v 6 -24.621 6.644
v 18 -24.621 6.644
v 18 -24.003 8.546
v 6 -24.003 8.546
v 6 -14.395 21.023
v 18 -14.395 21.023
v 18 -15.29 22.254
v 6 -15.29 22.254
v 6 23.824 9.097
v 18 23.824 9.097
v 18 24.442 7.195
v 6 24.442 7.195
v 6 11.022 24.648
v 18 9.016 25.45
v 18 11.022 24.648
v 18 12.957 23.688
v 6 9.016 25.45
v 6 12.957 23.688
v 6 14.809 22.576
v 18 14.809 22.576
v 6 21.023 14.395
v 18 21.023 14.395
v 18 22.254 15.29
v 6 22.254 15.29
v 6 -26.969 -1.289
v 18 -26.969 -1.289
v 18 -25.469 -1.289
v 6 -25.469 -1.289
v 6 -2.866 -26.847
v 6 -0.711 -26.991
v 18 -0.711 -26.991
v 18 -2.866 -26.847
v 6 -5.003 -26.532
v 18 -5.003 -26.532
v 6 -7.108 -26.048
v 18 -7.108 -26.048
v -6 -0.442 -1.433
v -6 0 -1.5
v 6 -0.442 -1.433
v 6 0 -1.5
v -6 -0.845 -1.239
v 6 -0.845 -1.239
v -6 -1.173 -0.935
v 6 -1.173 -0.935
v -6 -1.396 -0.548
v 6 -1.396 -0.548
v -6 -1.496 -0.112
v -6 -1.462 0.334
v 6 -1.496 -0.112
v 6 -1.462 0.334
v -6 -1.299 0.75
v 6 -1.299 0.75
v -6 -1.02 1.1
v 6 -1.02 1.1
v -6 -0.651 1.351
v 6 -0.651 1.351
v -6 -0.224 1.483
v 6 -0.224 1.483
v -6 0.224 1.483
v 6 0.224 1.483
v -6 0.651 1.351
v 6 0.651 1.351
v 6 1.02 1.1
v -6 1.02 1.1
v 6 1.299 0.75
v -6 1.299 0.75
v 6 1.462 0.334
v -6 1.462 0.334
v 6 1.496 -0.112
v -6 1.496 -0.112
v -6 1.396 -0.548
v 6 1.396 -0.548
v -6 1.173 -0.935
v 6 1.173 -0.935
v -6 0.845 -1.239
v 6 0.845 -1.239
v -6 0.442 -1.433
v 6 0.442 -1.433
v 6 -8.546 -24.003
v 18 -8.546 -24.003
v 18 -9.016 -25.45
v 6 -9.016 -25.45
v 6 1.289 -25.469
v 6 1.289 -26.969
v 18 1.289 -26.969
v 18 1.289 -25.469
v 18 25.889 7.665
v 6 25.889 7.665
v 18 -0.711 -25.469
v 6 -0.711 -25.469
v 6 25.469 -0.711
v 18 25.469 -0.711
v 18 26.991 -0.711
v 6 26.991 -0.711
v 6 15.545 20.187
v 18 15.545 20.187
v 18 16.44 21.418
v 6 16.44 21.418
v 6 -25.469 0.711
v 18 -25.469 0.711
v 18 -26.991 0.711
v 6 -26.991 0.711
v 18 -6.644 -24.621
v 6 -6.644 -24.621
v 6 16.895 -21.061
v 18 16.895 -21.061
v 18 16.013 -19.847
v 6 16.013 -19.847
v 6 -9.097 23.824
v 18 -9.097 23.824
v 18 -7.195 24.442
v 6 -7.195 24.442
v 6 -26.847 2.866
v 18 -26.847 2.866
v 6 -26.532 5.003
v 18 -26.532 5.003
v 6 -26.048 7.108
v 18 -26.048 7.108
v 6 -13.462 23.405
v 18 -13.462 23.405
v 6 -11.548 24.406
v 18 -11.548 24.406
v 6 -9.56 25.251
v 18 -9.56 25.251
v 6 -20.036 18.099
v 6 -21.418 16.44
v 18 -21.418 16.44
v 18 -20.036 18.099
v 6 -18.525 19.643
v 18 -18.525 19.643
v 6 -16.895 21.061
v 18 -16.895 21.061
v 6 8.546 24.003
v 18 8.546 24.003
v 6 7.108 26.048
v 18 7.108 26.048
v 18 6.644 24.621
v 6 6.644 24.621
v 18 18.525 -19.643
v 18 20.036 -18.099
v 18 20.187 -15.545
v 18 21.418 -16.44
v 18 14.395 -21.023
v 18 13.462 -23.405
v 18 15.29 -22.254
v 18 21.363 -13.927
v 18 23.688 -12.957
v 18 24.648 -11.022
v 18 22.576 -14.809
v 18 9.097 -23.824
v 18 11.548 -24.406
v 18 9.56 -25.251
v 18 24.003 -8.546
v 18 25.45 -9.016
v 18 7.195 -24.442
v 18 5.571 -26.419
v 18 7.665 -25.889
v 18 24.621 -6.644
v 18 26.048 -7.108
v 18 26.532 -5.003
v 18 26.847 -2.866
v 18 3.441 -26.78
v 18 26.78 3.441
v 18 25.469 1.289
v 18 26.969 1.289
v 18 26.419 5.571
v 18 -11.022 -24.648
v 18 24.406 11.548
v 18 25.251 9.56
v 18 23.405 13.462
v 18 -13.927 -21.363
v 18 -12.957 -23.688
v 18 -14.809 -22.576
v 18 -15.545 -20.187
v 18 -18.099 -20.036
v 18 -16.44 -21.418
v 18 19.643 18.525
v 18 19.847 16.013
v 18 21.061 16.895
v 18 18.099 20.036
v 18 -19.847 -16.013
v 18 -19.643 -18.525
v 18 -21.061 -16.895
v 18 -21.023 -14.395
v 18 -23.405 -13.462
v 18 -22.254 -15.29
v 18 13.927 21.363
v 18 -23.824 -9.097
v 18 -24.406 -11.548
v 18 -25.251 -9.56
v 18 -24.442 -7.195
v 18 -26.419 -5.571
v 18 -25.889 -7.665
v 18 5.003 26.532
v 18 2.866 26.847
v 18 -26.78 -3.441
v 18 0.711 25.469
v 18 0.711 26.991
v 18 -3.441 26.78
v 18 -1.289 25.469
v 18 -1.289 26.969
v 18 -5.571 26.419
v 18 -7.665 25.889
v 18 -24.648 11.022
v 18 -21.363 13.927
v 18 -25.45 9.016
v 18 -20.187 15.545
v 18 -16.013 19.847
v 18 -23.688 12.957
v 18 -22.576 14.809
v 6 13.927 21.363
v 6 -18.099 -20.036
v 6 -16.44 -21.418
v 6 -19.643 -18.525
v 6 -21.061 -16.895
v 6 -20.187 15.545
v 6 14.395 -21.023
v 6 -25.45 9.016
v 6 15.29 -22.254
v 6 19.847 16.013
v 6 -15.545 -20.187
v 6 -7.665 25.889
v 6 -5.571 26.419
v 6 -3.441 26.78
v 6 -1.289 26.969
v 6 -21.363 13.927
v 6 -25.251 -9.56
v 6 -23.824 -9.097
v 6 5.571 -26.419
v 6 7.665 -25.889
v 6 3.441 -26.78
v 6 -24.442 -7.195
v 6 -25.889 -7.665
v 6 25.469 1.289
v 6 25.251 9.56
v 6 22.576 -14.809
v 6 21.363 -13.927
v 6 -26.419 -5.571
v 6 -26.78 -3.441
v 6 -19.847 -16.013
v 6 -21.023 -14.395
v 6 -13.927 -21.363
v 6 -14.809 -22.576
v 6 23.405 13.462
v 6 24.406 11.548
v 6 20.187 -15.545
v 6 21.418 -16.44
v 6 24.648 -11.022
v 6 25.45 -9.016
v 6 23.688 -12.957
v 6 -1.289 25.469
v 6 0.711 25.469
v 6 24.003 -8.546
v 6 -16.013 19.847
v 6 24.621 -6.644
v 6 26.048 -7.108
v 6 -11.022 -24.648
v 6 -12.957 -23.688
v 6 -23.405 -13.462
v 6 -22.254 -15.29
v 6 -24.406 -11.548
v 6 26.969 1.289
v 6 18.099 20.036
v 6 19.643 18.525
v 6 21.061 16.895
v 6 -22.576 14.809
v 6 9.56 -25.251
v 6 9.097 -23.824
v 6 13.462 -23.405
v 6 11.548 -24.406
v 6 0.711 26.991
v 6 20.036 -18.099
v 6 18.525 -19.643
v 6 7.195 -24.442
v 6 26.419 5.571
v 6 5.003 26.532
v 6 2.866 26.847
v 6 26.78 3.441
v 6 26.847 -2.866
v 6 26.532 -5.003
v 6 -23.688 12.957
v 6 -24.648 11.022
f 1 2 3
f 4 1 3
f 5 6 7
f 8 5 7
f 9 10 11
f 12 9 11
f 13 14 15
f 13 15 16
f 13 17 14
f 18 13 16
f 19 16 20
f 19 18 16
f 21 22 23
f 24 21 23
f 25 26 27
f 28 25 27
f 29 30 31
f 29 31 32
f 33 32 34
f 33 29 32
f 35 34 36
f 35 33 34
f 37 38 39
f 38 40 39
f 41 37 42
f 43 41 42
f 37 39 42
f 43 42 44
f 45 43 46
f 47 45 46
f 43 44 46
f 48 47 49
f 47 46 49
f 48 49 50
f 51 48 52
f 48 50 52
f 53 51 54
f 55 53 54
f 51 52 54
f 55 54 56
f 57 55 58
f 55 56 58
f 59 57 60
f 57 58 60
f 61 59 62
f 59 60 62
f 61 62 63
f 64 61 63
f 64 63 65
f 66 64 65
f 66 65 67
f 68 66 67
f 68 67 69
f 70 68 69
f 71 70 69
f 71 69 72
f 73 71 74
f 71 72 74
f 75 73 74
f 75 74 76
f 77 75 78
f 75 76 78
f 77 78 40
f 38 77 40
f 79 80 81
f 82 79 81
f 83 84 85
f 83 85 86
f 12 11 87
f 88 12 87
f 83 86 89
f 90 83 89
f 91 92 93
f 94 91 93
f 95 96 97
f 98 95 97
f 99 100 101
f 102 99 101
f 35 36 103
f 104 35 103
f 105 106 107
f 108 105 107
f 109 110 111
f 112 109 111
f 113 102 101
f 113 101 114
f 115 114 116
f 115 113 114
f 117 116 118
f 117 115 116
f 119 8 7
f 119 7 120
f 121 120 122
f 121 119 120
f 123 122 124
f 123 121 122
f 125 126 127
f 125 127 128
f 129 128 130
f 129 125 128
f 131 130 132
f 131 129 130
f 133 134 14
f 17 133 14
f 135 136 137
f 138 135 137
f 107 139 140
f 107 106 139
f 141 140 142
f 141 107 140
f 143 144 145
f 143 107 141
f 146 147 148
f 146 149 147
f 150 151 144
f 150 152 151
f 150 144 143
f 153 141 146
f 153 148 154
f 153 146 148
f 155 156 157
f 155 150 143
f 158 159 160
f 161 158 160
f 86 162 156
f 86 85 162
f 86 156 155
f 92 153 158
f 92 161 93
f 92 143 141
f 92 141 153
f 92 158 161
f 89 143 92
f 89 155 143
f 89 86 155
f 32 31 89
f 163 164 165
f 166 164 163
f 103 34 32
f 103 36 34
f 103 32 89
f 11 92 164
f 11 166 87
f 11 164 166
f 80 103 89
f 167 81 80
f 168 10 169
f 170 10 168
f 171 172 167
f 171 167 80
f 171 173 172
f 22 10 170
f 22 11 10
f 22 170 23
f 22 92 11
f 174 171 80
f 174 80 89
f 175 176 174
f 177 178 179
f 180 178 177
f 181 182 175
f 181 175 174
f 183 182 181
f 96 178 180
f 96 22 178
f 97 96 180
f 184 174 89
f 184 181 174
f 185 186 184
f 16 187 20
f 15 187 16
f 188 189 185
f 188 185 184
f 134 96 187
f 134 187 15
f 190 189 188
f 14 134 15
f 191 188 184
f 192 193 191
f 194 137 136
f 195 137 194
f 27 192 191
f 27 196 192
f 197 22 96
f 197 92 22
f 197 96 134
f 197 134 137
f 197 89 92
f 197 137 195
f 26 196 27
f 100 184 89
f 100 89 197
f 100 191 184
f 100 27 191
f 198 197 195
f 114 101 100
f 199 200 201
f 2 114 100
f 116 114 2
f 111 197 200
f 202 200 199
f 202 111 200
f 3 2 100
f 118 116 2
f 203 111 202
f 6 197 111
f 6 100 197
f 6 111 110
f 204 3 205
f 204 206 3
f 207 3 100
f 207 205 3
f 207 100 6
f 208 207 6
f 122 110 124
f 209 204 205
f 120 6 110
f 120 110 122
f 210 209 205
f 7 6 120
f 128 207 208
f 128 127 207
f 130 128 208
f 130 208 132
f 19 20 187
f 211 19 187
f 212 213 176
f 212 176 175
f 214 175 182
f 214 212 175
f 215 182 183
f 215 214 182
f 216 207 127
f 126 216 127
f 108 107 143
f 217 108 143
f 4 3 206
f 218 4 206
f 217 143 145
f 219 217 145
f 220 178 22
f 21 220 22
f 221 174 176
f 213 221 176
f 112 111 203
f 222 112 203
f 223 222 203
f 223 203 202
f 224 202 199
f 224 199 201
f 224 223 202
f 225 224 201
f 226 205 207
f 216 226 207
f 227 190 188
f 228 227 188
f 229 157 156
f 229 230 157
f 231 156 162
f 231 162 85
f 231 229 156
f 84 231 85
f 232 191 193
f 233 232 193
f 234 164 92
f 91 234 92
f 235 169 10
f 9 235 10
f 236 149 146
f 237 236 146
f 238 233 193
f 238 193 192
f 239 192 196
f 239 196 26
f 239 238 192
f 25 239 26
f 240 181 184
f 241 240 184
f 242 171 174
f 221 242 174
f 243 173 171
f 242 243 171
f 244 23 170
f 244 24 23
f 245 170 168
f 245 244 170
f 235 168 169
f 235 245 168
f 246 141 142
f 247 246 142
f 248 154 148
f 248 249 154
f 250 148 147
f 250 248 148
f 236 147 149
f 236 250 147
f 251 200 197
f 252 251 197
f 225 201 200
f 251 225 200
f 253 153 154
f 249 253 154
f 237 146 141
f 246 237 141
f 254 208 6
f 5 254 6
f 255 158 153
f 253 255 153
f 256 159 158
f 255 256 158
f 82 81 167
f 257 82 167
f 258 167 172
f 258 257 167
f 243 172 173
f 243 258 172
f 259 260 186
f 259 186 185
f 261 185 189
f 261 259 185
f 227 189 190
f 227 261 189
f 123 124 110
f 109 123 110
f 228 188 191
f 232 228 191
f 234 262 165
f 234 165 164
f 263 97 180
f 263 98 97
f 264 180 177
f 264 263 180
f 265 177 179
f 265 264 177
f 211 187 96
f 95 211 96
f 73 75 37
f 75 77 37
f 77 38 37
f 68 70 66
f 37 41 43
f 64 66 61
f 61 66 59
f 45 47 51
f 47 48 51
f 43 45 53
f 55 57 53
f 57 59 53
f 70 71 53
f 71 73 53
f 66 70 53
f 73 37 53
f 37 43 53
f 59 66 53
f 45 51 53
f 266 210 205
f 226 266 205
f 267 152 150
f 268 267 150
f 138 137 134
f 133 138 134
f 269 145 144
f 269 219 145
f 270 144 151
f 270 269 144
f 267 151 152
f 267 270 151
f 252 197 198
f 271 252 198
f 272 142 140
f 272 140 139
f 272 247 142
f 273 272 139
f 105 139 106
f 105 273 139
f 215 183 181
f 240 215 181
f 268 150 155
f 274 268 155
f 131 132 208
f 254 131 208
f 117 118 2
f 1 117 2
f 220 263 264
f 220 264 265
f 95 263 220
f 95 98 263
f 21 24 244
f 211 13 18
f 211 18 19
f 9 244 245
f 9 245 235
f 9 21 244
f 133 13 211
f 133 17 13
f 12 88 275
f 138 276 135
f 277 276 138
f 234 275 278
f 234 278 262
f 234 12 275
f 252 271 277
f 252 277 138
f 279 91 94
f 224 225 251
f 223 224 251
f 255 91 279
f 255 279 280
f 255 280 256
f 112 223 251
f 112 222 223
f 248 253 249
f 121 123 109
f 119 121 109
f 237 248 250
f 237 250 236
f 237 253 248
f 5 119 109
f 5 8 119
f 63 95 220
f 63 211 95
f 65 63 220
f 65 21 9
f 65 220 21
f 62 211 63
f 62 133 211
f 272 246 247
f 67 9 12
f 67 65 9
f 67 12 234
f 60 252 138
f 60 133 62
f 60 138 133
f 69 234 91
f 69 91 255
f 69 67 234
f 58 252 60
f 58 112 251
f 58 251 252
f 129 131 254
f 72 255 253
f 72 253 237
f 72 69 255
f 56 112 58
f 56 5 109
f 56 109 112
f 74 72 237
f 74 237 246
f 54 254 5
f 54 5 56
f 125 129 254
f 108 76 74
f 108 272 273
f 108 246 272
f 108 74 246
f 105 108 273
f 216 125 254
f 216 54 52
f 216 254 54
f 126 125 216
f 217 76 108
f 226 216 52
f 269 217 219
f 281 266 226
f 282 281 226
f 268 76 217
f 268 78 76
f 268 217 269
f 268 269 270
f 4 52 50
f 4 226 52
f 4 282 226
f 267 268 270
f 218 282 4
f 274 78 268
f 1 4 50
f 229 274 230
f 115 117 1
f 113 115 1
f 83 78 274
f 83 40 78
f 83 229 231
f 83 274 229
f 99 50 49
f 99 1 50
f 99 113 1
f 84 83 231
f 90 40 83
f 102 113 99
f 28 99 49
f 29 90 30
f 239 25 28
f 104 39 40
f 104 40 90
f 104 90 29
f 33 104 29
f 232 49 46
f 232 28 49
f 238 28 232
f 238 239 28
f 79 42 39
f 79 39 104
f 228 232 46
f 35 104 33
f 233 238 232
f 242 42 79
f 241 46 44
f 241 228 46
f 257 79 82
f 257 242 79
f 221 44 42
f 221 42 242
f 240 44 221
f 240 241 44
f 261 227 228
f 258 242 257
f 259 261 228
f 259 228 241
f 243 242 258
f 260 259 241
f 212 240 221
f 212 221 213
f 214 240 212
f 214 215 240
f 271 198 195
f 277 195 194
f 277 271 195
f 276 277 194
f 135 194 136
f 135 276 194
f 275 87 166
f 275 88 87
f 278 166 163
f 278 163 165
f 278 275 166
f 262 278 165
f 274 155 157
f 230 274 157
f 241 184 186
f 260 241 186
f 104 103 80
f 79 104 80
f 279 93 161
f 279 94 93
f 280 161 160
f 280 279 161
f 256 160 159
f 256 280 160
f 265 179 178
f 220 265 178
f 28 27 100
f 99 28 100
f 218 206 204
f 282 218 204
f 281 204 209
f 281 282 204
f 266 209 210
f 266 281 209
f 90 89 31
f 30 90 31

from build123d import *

# Parameters (mm, degrees)
SKETCH2_W          = 12
SKETCH2_H          = 1.5
CUT_EXTRUDE3_DEPTH = 12


with BuildPart() as part:
    # Sketch2 → Revolve1 (revolve)
    with BuildSketch(Plane.XY, mode=Mode.PRIVATE) as revolve1_sk:
        Polygon((6, 1.5), (6, 0), (18, 0), (18, 27), (6, 27), align=None)
        with Locations((0, 0.75)):
            Rectangle(SKETCH2_W, SKETCH2_H)
    revolve(revolve1_sk.sketch.rotate(Axis((6, 0, 0), (-1, 0, 0)), 90), axis=Axis((6, 0, 0), (-1, 0, 0)))

    # Sketch3 → Cut-Extrude3 (cut)
    with BuildSketch(Plane(origin=(18, 0, 0), x_dir=(0, 0, -1), z_dir=(1, 0, 0))):
        Polygon((-7.194506707, 24.442263521), (-8.742565729, 29.206625443), (-10.641704711, 28.579512114), (-9.096619739, 23.824229533), align=None)
        Polygon((0.710692324, 25.469198833), (0.710669504, 30.478752832), (-1.289307676, 30.469198833), (-1.289307676, 25.469198833), align=None)
        Polygon((8.546323839, 24.003031509), (10.094339455, 28.767407535), (8.189295778, 29.37634808), (6.644210806, 24.621065498), align=None)
        Polygon((15.54538163, 20.187280222), (18.489905129, 24.240107954), (16.866273903, 25.407935699), (13.927347641, 21.362850727), align=None)
        Polygon((21.022749156, 14.395457294), (25.075550062, 17.340017716), (23.892263624, 18.952417544), (19.847178652, 16.013491283), align=None)
        Polygon((24.442263521, 7.194506707), (29.206625443, 8.742565729), (28.579512114, 10.641704711), (23.824229533, 9.096619739), align=None)
        Polygon((25.469198833, -0.710692324), (30.478752832, -0.710669504), (30.469198833, 1.289307676), (25.469198833, 1.289307676), align=None)
        Polygon((24.003031509, -8.546323839), (28.767407535, -10.094339455), (29.37634808, -8.189295778), (24.621065498, -6.644210806), align=None)
        Polygon((20.187280222, -15.54538163), (24.240107954, -18.489905129), (25.407935699, -16.866273903), (21.362850727, -13.927347641), align=None)
        Polygon((14.395457294, -21.022749156), (17.340017716, -25.075550062), (18.952417544, -23.892263624), (16.013491283, -19.847178652), align=None)
        Polygon((7.194506707, -24.442263521), (8.742565729, -29.206625443), (10.641704711, -28.579512114), (9.096619739, -23.824229533), align=None)
        Polygon((-0.710692324, -25.469198833), (-0.710669504, -30.478752832), (1.289307676, -30.469198833), (1.289307676, -25.469198833), align=None)
        Polygon((-8.546323839, -24.003031509), (-10.094339455, -28.767407535), (-8.189295778, -29.37634808), (-6.644210806, -24.621065498), align=None)
        Polygon((-15.54538163, -20.187280222), (-18.489905129, -24.240107954), (-16.866273903, -25.407935699), (-13.927347641, -21.362850727), align=None)
        Polygon((-21.022749156, -14.395457294), (-25.075550062, -17.340017716), (-23.892263624, -18.952417544), (-19.847178652, -16.013491283), align=None)
        Polygon((-24.442263521, -7.194506707), (-29.206625443, -8.742565729), (-28.579512114, -10.641704711), (-23.824229533, -9.096619739), align=None)
        Polygon((-25.469198833, 0.710692324), (-30.478752832, 0.710669504), (-30.469198833, -1.289307676), (-25.469198833, -1.289307676), align=None)
        Polygon((-24.003031509, 8.546323839), (-28.767407535, 10.094339455), (-29.37634808, 8.189295778), (-24.621065498, 6.644210806), align=None)
        Polygon((-20.187280222, 15.54538163), (-24.240107954, 18.489905129), (-25.407935699, 16.866273903), (-21.362850727, 13.927347641), align=None)
        Polygon((-14.395457294, 21.022749156), (-17.340017716, 25.075550062), (-18.952417544, 23.892263624), (-16.013491283, 19.847178652), align=None)
    extrude(amount=-CUT_EXTRUDE3_DEPTH, mode=Mode.SUBTRACT)


solid = part.part
